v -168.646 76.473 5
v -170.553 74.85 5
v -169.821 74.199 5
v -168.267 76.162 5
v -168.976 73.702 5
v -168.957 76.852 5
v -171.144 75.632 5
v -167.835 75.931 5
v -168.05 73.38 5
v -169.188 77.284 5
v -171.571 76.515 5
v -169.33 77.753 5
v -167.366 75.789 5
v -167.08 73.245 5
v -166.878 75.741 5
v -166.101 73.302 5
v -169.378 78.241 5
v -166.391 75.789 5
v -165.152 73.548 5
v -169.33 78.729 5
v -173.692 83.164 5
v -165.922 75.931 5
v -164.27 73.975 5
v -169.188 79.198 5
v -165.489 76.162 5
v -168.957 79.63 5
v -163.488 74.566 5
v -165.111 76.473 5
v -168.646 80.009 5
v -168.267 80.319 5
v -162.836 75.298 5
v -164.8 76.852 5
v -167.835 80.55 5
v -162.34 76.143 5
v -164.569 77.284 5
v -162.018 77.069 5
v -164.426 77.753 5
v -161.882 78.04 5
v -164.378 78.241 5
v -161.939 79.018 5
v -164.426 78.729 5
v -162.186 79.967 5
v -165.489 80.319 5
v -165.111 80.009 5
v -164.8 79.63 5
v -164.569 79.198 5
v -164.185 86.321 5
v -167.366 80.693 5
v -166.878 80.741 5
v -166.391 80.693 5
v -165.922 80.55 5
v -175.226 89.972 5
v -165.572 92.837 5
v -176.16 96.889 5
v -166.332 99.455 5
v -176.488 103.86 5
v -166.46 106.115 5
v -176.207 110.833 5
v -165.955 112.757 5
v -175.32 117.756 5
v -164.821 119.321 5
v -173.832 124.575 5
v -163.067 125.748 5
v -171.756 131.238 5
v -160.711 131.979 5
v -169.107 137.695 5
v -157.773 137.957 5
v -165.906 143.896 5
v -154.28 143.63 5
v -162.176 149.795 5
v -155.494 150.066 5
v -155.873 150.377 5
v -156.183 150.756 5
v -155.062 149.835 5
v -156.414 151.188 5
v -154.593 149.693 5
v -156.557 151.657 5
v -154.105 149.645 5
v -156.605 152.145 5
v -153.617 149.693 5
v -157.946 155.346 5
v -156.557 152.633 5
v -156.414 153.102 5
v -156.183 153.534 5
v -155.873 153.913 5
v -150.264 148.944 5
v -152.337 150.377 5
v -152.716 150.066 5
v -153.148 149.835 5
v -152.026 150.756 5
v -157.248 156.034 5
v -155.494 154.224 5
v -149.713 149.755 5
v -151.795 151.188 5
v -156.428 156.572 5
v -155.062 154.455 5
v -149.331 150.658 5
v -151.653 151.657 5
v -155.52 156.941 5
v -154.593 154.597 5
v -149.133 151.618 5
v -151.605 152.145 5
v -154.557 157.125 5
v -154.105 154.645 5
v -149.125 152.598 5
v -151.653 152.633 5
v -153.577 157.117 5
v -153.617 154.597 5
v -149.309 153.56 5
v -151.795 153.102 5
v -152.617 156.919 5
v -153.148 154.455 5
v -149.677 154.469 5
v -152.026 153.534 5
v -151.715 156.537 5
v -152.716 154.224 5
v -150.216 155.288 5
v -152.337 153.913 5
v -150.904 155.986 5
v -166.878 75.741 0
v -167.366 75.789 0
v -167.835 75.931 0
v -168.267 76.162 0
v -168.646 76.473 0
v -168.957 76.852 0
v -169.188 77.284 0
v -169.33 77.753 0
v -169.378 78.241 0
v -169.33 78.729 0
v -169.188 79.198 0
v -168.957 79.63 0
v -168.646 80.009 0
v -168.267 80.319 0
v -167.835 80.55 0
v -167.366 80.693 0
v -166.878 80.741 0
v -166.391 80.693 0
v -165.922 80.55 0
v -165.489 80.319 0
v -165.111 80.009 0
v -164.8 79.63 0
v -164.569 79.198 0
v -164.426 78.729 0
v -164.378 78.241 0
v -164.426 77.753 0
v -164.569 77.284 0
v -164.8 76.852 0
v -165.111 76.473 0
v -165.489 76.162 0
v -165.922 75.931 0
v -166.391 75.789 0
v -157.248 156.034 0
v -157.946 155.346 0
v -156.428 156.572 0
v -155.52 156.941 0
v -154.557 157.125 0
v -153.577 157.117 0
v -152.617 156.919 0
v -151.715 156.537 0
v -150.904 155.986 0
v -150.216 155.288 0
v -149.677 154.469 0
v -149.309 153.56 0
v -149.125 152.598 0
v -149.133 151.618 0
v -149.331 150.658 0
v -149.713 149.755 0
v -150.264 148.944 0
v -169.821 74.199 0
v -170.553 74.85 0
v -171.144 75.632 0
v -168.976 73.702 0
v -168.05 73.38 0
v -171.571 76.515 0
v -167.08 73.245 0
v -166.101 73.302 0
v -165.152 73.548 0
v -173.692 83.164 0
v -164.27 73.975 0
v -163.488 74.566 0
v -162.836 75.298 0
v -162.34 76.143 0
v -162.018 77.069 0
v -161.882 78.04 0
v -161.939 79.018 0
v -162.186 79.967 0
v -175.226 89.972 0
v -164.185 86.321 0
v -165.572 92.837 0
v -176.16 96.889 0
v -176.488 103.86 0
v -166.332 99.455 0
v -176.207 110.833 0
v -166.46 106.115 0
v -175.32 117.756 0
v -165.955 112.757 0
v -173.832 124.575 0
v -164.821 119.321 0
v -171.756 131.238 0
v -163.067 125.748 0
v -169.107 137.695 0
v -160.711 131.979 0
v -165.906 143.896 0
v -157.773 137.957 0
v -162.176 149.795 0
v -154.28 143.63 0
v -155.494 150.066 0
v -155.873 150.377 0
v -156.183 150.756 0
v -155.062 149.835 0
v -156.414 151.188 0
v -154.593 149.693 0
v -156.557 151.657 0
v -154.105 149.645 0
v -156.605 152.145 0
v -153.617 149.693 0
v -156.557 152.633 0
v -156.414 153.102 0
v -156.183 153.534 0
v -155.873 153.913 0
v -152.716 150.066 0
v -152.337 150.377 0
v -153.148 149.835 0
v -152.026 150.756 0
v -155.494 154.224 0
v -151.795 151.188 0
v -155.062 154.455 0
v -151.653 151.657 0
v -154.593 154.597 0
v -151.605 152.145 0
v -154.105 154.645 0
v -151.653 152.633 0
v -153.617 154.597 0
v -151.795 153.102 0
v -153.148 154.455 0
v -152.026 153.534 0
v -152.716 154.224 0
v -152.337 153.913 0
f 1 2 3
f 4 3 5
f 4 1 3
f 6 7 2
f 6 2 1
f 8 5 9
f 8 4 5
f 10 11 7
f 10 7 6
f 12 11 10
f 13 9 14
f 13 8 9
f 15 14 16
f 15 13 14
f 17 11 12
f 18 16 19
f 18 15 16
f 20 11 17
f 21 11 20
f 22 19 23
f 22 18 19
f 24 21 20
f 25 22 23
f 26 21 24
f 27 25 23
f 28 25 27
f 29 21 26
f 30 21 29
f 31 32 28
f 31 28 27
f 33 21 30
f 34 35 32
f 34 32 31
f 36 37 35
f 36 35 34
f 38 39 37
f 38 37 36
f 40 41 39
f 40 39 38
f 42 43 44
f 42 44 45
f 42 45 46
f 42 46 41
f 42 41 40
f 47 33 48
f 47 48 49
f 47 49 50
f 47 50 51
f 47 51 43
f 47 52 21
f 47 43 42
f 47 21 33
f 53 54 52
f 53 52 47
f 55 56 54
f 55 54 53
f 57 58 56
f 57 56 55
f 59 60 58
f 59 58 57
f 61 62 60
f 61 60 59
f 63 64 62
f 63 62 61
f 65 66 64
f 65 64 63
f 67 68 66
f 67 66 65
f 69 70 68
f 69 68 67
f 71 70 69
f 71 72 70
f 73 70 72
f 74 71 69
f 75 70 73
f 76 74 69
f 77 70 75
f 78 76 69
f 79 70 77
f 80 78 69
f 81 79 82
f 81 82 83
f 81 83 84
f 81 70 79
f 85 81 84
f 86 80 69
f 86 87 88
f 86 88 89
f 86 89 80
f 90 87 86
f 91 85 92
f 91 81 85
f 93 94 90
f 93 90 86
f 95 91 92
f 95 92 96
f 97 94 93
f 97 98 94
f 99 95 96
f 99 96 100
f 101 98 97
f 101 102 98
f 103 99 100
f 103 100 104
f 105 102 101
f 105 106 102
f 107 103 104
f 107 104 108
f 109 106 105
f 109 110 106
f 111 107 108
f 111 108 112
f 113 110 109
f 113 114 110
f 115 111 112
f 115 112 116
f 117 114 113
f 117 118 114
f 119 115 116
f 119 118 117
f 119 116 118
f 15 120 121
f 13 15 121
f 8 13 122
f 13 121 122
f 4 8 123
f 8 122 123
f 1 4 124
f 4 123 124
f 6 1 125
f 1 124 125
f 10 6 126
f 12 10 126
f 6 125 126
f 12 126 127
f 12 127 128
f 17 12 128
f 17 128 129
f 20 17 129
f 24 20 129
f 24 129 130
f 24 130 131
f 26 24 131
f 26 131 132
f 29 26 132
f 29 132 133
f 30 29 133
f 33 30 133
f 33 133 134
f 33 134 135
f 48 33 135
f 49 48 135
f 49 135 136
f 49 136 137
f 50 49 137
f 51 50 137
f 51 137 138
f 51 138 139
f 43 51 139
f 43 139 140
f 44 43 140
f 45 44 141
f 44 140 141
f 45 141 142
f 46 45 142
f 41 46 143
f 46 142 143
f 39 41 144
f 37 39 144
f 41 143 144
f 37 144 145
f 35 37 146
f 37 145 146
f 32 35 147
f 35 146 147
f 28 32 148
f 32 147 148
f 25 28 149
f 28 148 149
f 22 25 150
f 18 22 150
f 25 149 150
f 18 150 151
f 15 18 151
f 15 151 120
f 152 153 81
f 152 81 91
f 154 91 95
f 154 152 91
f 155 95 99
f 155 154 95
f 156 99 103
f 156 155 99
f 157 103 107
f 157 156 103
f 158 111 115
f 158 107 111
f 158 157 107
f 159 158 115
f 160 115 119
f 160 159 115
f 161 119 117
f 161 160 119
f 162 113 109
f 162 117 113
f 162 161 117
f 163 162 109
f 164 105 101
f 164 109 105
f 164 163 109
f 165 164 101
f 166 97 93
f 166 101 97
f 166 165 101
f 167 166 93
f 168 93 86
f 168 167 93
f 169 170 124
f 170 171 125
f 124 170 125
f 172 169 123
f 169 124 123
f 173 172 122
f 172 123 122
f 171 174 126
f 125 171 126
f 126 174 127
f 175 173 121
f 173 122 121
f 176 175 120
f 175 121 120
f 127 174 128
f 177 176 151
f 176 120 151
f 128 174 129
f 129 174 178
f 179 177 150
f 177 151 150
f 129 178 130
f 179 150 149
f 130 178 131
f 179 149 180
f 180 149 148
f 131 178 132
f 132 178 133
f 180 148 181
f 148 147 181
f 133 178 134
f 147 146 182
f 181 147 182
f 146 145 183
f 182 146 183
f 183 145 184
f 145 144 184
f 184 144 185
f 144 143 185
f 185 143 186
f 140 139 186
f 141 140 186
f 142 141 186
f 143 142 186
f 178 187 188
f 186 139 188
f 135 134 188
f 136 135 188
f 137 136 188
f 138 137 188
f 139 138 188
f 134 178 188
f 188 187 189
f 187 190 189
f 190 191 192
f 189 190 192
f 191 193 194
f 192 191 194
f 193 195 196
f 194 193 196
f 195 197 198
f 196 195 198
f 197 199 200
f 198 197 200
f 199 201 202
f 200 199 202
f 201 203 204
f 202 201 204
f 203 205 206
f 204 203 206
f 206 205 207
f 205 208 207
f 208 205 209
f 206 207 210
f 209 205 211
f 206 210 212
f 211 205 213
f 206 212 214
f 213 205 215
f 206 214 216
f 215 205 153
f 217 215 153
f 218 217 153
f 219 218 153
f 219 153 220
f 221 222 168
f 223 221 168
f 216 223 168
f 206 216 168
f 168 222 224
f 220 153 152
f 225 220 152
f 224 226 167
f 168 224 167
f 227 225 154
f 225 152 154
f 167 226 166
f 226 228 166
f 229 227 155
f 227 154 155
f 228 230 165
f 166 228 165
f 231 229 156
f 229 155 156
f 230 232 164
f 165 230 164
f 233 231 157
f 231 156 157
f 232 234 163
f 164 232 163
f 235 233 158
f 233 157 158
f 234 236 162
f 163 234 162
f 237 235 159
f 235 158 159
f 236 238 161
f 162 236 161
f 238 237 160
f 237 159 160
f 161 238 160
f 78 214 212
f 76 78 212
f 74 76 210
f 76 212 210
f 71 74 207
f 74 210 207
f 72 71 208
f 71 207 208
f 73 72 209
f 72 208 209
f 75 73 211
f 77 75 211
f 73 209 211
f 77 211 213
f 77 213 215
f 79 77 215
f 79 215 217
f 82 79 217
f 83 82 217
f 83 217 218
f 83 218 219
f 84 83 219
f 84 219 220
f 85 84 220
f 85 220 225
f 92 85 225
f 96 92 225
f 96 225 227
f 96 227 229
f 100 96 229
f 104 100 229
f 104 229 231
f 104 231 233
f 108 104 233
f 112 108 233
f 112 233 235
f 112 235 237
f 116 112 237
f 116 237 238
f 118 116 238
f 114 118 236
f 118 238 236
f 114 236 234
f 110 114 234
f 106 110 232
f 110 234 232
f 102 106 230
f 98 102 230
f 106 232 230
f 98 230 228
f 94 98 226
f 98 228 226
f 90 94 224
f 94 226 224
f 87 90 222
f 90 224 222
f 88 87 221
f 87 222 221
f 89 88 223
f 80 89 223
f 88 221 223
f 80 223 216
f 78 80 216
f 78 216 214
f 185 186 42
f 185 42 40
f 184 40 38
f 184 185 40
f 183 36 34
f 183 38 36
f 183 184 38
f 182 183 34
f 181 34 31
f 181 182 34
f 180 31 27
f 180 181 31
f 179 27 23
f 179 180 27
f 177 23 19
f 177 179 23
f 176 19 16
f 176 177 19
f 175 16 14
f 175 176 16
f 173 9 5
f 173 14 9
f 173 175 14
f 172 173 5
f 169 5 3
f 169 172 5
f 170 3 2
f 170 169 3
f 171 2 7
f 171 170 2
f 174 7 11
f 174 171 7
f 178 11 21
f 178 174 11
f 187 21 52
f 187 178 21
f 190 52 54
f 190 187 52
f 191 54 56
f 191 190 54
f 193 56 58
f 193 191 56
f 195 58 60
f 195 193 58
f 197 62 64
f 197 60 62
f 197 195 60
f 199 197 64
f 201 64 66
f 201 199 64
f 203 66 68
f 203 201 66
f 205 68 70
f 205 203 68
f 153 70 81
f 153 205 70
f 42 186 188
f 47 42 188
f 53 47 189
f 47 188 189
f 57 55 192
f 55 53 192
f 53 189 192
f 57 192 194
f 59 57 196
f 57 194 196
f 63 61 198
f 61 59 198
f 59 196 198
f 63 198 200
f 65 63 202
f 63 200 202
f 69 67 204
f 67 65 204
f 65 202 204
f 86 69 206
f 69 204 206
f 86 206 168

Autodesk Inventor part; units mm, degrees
ref_plane "YZ Plane" through (0, 0, 0) normal (1, 0, 0) x (0, 1, 0)
ref_plane "XZ Plane" through (0, 0, 0) normal (0, 1, 0) x (-1, 0, 0)
ref_plane "XY Plane" through (0, 0, 0) normal (0, 0, 1) x (1, 0, 0)
sketch "Sketch1" plane through (0, 0, 0) normal (0, 0, 1) x (1, 0, 0)
  arc A0 (-154.1048, 152.1451) -> (-166.8784, 78.2408) centre (-96.4886, 104.1307) ccw construction
  arc A1 (-157.9458, 155.346) -> (-171.571, 76.5148) centre (-96.4886, 104.1307) ccw
  arc A2 (-150.2637, 148.9441) -> (-162.1857, 79.9668) centre (-96.4886, 104.1307) ccw
  arc A3 (-150.2637, 148.9441) -> (-157.9458, 155.346) centre (-154.1048, 152.1451) ccw
  arc A4 (-171.571, 76.5148) -> (-162.1857, 79.9668) centre (-166.8784, 78.2408) ccw
  line L0 (-154.1048, 152.1451) -> (-96.4886, 104.1307) construction
  line L1 (-96.4886, 104.1307) -> (-166.8784, 78.2408) construction
  point P0 (0, 0)
  dimension "d1" = 75
  dimension "d2" = 10
  dimension "d5" = 60
extrude "Extrusion1" add sketch "Sketch1" along normal blind 5
sketch "Sketch2" plane through (0, 0, 5) normal (0, 0, 1) x (1, 0, 0)
  arc A0 (-157.9458, 155.346) -> (-171.571, 76.5148) centre (-96.4886, 104.1307) ccw projected
  arc A1 (-171.571, 76.5148) -> (-162.1857, 79.9668) centre (-166.8784, 78.2408) ccw projected
  arc A2 (-150.2637, 148.9441) -> (-162.1857, 79.9668) centre (-96.4886, 104.1307) ccw projected
  arc A3 (-150.2637, 148.9441) -> (-157.9458, 155.346) centre (-154.1048, 152.1451) ccw projected
  point P0 (0, 0)
hole "Hole1" at (-154.1048, 152.1451, 5) at (-166.8784, 78.2408, 5) direction (0, 0, -1) diameter 5 end through all
properties part number "ledeplate"
